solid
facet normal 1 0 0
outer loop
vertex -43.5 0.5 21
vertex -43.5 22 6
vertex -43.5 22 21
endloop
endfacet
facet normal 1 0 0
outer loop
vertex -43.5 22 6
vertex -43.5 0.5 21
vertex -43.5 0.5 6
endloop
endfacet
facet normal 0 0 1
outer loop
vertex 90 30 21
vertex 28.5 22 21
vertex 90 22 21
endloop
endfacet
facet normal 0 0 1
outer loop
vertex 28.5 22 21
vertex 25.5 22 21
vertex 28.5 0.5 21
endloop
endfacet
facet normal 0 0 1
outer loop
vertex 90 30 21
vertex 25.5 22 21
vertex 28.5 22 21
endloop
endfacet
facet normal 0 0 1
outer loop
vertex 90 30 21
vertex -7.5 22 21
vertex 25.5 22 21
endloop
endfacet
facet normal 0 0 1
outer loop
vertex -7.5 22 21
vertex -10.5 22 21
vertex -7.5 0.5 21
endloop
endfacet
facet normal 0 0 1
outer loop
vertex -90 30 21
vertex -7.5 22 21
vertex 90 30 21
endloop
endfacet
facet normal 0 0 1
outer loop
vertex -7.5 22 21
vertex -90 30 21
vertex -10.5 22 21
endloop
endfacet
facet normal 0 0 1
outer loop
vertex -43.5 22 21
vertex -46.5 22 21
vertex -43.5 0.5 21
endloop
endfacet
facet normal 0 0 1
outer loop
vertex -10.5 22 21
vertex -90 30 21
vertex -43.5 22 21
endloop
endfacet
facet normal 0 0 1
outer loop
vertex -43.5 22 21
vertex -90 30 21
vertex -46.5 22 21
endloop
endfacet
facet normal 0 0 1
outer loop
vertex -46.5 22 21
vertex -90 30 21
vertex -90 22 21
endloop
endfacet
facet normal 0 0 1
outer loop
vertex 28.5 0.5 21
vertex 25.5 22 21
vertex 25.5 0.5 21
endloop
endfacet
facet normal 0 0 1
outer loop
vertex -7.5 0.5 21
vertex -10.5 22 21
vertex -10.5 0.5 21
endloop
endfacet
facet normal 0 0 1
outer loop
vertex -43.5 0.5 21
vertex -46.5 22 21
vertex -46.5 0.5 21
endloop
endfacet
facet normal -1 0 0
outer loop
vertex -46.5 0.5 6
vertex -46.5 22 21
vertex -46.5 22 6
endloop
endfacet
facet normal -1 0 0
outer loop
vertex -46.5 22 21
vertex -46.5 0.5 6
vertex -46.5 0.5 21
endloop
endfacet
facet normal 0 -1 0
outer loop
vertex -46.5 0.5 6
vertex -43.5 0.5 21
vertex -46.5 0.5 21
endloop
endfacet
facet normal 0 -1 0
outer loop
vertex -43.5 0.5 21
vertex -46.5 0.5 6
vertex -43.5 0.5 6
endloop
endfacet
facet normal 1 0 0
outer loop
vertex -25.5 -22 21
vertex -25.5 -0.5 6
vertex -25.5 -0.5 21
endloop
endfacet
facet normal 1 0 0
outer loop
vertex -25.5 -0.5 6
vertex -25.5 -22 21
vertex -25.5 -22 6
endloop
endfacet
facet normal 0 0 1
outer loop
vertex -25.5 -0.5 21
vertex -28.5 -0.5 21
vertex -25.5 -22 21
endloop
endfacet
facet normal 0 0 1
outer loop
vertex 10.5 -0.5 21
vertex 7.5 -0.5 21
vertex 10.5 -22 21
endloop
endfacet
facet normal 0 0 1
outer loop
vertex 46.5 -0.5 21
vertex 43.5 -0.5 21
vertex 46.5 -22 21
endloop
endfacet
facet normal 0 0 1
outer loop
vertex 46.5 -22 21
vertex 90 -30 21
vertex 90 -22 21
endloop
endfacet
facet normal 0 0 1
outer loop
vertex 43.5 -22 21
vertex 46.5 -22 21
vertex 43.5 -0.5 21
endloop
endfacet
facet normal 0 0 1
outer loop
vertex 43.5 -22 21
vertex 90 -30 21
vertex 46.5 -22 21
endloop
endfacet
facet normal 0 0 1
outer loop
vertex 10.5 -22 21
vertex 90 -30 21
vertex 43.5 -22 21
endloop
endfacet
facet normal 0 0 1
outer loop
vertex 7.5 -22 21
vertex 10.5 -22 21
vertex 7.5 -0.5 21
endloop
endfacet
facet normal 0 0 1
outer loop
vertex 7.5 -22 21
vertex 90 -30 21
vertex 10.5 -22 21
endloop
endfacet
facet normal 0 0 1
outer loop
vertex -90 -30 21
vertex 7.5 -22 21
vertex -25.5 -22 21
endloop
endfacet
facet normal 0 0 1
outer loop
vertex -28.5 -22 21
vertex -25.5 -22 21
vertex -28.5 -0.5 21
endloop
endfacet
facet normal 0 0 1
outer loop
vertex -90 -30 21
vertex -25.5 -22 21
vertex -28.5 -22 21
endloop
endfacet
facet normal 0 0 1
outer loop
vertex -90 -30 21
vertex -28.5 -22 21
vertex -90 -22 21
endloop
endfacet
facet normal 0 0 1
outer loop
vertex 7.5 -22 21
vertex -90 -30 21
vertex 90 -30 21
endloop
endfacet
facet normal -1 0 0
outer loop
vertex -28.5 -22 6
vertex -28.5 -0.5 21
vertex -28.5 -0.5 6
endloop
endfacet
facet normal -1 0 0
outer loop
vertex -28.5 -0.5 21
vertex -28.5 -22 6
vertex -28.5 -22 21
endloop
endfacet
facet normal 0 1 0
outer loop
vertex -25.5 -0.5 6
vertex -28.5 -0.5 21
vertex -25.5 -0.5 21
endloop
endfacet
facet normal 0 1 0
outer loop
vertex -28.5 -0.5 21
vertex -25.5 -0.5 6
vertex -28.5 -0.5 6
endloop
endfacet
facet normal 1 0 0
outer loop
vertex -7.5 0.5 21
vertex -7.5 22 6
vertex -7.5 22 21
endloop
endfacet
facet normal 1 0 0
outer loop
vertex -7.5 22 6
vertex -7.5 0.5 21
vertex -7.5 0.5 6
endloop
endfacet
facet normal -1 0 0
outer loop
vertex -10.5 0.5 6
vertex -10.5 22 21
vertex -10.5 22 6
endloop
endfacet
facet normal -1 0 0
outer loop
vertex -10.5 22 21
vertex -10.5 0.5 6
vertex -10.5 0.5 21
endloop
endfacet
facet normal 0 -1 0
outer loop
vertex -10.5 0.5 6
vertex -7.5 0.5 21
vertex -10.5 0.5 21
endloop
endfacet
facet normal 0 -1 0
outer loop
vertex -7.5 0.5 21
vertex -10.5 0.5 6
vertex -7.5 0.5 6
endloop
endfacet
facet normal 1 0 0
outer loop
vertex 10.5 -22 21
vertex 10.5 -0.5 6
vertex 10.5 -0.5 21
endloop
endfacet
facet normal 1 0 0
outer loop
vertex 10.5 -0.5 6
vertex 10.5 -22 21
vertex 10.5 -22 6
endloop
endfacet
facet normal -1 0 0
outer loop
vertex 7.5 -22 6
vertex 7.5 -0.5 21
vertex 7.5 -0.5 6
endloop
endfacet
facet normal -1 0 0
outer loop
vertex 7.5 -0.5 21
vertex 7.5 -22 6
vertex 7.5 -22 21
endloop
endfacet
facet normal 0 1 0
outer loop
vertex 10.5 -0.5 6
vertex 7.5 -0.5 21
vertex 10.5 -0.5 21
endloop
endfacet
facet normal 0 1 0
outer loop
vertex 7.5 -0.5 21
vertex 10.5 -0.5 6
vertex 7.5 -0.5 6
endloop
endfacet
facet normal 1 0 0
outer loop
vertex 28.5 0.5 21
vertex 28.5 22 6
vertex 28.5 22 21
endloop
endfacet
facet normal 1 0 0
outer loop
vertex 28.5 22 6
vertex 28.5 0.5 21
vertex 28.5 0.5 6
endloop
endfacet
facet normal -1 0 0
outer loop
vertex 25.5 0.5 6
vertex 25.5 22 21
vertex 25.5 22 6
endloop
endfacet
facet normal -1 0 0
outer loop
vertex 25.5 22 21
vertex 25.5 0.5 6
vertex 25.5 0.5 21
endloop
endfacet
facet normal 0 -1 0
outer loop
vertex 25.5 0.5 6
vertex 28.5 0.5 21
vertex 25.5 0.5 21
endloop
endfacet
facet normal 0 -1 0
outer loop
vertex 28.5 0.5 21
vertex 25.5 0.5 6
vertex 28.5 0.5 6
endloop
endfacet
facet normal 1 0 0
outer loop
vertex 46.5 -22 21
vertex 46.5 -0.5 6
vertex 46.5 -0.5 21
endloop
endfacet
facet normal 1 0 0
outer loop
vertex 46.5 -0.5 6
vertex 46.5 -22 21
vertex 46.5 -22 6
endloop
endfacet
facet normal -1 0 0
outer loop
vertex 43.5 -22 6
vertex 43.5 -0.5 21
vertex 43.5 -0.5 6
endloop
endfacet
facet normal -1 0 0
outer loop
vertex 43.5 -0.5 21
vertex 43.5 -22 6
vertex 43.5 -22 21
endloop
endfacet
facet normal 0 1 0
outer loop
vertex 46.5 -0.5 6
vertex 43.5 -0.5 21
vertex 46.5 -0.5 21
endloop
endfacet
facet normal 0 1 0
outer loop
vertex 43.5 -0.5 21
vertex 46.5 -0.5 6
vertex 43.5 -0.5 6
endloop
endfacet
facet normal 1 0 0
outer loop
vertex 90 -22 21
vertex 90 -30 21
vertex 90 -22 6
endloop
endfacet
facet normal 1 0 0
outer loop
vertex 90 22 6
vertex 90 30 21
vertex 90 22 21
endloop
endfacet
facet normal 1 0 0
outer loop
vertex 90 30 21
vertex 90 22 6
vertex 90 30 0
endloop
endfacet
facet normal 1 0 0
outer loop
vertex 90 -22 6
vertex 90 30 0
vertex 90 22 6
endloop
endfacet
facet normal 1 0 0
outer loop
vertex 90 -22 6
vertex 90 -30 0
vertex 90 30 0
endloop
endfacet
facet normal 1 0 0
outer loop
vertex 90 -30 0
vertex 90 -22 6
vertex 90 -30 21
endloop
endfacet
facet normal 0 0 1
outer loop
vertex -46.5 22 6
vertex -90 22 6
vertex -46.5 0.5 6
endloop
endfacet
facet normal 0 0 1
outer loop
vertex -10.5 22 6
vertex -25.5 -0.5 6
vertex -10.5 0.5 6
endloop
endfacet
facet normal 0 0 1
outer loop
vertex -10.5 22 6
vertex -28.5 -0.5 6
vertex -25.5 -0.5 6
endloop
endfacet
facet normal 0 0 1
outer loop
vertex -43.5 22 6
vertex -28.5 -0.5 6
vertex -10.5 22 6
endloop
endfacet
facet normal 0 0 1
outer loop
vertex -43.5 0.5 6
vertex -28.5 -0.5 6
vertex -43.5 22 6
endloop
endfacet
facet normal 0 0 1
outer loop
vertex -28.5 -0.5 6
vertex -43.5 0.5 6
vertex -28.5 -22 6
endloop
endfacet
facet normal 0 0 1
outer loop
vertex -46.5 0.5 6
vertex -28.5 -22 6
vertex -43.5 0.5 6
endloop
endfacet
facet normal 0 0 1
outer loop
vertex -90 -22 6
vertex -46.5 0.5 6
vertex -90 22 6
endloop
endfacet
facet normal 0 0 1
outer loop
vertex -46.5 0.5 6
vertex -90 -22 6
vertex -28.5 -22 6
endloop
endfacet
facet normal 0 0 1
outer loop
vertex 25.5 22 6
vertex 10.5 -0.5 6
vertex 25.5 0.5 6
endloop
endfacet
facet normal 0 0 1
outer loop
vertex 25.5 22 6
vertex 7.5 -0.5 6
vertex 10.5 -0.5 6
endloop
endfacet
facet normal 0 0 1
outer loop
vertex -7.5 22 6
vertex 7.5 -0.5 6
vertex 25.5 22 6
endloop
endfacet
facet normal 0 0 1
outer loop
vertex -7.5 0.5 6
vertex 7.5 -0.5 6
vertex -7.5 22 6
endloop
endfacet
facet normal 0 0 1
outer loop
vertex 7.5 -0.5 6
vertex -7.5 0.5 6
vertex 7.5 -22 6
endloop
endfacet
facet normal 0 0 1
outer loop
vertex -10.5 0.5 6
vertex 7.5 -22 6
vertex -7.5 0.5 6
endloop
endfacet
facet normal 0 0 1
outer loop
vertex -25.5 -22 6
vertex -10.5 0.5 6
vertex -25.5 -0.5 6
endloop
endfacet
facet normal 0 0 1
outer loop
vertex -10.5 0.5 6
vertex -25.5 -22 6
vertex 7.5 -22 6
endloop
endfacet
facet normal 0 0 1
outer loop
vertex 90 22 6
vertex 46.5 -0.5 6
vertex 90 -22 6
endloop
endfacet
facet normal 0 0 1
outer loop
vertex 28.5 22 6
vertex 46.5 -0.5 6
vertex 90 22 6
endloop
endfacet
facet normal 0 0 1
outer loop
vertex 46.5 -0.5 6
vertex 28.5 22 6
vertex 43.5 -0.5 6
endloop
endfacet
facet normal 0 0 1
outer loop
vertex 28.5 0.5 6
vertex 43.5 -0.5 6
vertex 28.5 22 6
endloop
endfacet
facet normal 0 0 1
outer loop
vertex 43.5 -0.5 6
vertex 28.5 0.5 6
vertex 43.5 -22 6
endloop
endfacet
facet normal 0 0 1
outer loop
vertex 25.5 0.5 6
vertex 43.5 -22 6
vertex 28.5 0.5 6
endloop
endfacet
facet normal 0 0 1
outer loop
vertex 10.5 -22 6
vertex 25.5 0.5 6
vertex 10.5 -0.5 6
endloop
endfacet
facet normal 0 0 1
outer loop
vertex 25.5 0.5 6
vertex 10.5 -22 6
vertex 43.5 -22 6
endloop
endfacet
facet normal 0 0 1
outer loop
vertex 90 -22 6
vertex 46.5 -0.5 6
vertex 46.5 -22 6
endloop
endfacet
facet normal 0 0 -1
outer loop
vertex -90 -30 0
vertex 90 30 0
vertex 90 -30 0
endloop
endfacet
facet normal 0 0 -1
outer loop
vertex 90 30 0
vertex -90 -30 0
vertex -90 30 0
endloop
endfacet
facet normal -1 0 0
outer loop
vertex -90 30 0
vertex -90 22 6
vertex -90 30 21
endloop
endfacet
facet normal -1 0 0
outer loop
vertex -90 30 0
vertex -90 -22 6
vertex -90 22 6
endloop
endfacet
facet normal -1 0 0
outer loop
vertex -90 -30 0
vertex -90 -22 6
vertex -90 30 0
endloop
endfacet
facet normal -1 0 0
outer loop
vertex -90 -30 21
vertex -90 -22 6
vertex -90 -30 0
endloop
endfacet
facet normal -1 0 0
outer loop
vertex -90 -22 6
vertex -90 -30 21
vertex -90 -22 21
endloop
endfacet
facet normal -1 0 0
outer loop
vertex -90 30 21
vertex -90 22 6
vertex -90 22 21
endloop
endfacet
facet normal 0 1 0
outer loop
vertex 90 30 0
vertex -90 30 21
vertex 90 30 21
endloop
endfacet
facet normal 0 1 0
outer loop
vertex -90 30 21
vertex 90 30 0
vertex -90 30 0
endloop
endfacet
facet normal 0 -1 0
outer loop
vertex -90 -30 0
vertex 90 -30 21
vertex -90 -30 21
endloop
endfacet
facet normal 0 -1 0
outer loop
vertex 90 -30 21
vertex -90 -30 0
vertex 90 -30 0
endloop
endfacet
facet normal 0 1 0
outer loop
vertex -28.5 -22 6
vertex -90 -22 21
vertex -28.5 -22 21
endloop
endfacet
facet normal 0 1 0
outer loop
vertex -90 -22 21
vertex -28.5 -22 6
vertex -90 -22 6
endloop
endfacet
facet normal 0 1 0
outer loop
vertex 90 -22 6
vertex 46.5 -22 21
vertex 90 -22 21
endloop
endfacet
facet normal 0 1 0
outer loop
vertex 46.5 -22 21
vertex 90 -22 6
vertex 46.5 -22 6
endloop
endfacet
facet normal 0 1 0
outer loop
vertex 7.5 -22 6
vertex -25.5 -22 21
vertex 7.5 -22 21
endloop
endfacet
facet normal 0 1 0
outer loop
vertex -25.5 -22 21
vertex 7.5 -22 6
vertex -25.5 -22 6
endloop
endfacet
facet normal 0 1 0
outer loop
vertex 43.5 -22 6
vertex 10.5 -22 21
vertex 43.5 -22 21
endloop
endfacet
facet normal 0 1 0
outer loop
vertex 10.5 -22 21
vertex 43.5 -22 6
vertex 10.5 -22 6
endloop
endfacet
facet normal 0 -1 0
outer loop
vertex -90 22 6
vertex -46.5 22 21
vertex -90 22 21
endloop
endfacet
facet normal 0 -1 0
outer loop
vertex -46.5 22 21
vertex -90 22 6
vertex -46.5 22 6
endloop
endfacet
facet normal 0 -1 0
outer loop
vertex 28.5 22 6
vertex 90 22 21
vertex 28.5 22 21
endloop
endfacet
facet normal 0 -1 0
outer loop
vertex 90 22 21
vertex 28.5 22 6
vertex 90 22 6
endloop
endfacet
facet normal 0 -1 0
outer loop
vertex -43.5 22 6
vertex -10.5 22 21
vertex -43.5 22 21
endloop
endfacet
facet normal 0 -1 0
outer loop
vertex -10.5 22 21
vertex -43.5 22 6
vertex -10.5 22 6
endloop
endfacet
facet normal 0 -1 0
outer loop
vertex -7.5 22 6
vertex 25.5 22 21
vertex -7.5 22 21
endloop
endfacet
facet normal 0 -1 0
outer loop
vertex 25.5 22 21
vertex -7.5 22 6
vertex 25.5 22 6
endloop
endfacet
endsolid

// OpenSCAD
$fn = 32;

// ----------------------------------------------------------------------
// Rib frame 180 x 60 x 21
// 6 ribs at 18 mm pitch, staggered
// ----------------------------------------------------------------------

// --- parameters (mm) ---
frame = [180, 60, 6];  // base plate size (x, y, z)
rail_w = 8;            // side rail width
ribs = 6;              // number of ribs
rib_t = 3;             // rib thickness
rib_h = 15;            // rib height above the base plate
pitch = 18;            // pitch between rib centres

// --- derived feature positions (mm) ---
span = (ribs - 1) * pitch;          // = 90   distance between the outer ribs
origin_x = -span / 2;               // = -45   X of the first rib
rib_len = frame[1] / 2 - rail_w + 0.5;  // = 22.5   length of a staggered rib
rib_y = 0.5 + rib_len / 2;          // = 11.75   Y of a staggered rib centre
row_offset = 2 * rib_y;             // = 23.5   distance between the two rows
feature_centers = [
  [origin_x + 0 * pitch, rib_y],
  [origin_x + 1 * pitch, -rib_y],
  [origin_x + 2 * pitch, rib_y],
  [origin_x + 3 * pitch, -rib_y],
  [origin_x + 4 * pitch, rib_y],
  [origin_x + 5 * pitch, -rib_y]
];   // rib centre line, drives the rib loop

// base plate, two side rails, then the ribs read straight off feature_centers
union() {
  translate([-frame[0] / 2, -frame[1] / 2, 0]) cube(frame);
  translate([-frame[0] / 2, -frame[1] / 2, 0]) cube([frame[0], rail_w, frame[2] + rib_h]);
  translate([-frame[0] / 2, frame[1] / 2 - rail_w, 0]) cube([frame[0], rail_w, frame[2] + rib_h]);
  for (centre = feature_centers)
    translate([centre[0] - rib_t / 2, centre[1] - rib_len / 2, frame[2] - 1])
      cube([rib_t, rib_len, rib_h + 1]);
}
